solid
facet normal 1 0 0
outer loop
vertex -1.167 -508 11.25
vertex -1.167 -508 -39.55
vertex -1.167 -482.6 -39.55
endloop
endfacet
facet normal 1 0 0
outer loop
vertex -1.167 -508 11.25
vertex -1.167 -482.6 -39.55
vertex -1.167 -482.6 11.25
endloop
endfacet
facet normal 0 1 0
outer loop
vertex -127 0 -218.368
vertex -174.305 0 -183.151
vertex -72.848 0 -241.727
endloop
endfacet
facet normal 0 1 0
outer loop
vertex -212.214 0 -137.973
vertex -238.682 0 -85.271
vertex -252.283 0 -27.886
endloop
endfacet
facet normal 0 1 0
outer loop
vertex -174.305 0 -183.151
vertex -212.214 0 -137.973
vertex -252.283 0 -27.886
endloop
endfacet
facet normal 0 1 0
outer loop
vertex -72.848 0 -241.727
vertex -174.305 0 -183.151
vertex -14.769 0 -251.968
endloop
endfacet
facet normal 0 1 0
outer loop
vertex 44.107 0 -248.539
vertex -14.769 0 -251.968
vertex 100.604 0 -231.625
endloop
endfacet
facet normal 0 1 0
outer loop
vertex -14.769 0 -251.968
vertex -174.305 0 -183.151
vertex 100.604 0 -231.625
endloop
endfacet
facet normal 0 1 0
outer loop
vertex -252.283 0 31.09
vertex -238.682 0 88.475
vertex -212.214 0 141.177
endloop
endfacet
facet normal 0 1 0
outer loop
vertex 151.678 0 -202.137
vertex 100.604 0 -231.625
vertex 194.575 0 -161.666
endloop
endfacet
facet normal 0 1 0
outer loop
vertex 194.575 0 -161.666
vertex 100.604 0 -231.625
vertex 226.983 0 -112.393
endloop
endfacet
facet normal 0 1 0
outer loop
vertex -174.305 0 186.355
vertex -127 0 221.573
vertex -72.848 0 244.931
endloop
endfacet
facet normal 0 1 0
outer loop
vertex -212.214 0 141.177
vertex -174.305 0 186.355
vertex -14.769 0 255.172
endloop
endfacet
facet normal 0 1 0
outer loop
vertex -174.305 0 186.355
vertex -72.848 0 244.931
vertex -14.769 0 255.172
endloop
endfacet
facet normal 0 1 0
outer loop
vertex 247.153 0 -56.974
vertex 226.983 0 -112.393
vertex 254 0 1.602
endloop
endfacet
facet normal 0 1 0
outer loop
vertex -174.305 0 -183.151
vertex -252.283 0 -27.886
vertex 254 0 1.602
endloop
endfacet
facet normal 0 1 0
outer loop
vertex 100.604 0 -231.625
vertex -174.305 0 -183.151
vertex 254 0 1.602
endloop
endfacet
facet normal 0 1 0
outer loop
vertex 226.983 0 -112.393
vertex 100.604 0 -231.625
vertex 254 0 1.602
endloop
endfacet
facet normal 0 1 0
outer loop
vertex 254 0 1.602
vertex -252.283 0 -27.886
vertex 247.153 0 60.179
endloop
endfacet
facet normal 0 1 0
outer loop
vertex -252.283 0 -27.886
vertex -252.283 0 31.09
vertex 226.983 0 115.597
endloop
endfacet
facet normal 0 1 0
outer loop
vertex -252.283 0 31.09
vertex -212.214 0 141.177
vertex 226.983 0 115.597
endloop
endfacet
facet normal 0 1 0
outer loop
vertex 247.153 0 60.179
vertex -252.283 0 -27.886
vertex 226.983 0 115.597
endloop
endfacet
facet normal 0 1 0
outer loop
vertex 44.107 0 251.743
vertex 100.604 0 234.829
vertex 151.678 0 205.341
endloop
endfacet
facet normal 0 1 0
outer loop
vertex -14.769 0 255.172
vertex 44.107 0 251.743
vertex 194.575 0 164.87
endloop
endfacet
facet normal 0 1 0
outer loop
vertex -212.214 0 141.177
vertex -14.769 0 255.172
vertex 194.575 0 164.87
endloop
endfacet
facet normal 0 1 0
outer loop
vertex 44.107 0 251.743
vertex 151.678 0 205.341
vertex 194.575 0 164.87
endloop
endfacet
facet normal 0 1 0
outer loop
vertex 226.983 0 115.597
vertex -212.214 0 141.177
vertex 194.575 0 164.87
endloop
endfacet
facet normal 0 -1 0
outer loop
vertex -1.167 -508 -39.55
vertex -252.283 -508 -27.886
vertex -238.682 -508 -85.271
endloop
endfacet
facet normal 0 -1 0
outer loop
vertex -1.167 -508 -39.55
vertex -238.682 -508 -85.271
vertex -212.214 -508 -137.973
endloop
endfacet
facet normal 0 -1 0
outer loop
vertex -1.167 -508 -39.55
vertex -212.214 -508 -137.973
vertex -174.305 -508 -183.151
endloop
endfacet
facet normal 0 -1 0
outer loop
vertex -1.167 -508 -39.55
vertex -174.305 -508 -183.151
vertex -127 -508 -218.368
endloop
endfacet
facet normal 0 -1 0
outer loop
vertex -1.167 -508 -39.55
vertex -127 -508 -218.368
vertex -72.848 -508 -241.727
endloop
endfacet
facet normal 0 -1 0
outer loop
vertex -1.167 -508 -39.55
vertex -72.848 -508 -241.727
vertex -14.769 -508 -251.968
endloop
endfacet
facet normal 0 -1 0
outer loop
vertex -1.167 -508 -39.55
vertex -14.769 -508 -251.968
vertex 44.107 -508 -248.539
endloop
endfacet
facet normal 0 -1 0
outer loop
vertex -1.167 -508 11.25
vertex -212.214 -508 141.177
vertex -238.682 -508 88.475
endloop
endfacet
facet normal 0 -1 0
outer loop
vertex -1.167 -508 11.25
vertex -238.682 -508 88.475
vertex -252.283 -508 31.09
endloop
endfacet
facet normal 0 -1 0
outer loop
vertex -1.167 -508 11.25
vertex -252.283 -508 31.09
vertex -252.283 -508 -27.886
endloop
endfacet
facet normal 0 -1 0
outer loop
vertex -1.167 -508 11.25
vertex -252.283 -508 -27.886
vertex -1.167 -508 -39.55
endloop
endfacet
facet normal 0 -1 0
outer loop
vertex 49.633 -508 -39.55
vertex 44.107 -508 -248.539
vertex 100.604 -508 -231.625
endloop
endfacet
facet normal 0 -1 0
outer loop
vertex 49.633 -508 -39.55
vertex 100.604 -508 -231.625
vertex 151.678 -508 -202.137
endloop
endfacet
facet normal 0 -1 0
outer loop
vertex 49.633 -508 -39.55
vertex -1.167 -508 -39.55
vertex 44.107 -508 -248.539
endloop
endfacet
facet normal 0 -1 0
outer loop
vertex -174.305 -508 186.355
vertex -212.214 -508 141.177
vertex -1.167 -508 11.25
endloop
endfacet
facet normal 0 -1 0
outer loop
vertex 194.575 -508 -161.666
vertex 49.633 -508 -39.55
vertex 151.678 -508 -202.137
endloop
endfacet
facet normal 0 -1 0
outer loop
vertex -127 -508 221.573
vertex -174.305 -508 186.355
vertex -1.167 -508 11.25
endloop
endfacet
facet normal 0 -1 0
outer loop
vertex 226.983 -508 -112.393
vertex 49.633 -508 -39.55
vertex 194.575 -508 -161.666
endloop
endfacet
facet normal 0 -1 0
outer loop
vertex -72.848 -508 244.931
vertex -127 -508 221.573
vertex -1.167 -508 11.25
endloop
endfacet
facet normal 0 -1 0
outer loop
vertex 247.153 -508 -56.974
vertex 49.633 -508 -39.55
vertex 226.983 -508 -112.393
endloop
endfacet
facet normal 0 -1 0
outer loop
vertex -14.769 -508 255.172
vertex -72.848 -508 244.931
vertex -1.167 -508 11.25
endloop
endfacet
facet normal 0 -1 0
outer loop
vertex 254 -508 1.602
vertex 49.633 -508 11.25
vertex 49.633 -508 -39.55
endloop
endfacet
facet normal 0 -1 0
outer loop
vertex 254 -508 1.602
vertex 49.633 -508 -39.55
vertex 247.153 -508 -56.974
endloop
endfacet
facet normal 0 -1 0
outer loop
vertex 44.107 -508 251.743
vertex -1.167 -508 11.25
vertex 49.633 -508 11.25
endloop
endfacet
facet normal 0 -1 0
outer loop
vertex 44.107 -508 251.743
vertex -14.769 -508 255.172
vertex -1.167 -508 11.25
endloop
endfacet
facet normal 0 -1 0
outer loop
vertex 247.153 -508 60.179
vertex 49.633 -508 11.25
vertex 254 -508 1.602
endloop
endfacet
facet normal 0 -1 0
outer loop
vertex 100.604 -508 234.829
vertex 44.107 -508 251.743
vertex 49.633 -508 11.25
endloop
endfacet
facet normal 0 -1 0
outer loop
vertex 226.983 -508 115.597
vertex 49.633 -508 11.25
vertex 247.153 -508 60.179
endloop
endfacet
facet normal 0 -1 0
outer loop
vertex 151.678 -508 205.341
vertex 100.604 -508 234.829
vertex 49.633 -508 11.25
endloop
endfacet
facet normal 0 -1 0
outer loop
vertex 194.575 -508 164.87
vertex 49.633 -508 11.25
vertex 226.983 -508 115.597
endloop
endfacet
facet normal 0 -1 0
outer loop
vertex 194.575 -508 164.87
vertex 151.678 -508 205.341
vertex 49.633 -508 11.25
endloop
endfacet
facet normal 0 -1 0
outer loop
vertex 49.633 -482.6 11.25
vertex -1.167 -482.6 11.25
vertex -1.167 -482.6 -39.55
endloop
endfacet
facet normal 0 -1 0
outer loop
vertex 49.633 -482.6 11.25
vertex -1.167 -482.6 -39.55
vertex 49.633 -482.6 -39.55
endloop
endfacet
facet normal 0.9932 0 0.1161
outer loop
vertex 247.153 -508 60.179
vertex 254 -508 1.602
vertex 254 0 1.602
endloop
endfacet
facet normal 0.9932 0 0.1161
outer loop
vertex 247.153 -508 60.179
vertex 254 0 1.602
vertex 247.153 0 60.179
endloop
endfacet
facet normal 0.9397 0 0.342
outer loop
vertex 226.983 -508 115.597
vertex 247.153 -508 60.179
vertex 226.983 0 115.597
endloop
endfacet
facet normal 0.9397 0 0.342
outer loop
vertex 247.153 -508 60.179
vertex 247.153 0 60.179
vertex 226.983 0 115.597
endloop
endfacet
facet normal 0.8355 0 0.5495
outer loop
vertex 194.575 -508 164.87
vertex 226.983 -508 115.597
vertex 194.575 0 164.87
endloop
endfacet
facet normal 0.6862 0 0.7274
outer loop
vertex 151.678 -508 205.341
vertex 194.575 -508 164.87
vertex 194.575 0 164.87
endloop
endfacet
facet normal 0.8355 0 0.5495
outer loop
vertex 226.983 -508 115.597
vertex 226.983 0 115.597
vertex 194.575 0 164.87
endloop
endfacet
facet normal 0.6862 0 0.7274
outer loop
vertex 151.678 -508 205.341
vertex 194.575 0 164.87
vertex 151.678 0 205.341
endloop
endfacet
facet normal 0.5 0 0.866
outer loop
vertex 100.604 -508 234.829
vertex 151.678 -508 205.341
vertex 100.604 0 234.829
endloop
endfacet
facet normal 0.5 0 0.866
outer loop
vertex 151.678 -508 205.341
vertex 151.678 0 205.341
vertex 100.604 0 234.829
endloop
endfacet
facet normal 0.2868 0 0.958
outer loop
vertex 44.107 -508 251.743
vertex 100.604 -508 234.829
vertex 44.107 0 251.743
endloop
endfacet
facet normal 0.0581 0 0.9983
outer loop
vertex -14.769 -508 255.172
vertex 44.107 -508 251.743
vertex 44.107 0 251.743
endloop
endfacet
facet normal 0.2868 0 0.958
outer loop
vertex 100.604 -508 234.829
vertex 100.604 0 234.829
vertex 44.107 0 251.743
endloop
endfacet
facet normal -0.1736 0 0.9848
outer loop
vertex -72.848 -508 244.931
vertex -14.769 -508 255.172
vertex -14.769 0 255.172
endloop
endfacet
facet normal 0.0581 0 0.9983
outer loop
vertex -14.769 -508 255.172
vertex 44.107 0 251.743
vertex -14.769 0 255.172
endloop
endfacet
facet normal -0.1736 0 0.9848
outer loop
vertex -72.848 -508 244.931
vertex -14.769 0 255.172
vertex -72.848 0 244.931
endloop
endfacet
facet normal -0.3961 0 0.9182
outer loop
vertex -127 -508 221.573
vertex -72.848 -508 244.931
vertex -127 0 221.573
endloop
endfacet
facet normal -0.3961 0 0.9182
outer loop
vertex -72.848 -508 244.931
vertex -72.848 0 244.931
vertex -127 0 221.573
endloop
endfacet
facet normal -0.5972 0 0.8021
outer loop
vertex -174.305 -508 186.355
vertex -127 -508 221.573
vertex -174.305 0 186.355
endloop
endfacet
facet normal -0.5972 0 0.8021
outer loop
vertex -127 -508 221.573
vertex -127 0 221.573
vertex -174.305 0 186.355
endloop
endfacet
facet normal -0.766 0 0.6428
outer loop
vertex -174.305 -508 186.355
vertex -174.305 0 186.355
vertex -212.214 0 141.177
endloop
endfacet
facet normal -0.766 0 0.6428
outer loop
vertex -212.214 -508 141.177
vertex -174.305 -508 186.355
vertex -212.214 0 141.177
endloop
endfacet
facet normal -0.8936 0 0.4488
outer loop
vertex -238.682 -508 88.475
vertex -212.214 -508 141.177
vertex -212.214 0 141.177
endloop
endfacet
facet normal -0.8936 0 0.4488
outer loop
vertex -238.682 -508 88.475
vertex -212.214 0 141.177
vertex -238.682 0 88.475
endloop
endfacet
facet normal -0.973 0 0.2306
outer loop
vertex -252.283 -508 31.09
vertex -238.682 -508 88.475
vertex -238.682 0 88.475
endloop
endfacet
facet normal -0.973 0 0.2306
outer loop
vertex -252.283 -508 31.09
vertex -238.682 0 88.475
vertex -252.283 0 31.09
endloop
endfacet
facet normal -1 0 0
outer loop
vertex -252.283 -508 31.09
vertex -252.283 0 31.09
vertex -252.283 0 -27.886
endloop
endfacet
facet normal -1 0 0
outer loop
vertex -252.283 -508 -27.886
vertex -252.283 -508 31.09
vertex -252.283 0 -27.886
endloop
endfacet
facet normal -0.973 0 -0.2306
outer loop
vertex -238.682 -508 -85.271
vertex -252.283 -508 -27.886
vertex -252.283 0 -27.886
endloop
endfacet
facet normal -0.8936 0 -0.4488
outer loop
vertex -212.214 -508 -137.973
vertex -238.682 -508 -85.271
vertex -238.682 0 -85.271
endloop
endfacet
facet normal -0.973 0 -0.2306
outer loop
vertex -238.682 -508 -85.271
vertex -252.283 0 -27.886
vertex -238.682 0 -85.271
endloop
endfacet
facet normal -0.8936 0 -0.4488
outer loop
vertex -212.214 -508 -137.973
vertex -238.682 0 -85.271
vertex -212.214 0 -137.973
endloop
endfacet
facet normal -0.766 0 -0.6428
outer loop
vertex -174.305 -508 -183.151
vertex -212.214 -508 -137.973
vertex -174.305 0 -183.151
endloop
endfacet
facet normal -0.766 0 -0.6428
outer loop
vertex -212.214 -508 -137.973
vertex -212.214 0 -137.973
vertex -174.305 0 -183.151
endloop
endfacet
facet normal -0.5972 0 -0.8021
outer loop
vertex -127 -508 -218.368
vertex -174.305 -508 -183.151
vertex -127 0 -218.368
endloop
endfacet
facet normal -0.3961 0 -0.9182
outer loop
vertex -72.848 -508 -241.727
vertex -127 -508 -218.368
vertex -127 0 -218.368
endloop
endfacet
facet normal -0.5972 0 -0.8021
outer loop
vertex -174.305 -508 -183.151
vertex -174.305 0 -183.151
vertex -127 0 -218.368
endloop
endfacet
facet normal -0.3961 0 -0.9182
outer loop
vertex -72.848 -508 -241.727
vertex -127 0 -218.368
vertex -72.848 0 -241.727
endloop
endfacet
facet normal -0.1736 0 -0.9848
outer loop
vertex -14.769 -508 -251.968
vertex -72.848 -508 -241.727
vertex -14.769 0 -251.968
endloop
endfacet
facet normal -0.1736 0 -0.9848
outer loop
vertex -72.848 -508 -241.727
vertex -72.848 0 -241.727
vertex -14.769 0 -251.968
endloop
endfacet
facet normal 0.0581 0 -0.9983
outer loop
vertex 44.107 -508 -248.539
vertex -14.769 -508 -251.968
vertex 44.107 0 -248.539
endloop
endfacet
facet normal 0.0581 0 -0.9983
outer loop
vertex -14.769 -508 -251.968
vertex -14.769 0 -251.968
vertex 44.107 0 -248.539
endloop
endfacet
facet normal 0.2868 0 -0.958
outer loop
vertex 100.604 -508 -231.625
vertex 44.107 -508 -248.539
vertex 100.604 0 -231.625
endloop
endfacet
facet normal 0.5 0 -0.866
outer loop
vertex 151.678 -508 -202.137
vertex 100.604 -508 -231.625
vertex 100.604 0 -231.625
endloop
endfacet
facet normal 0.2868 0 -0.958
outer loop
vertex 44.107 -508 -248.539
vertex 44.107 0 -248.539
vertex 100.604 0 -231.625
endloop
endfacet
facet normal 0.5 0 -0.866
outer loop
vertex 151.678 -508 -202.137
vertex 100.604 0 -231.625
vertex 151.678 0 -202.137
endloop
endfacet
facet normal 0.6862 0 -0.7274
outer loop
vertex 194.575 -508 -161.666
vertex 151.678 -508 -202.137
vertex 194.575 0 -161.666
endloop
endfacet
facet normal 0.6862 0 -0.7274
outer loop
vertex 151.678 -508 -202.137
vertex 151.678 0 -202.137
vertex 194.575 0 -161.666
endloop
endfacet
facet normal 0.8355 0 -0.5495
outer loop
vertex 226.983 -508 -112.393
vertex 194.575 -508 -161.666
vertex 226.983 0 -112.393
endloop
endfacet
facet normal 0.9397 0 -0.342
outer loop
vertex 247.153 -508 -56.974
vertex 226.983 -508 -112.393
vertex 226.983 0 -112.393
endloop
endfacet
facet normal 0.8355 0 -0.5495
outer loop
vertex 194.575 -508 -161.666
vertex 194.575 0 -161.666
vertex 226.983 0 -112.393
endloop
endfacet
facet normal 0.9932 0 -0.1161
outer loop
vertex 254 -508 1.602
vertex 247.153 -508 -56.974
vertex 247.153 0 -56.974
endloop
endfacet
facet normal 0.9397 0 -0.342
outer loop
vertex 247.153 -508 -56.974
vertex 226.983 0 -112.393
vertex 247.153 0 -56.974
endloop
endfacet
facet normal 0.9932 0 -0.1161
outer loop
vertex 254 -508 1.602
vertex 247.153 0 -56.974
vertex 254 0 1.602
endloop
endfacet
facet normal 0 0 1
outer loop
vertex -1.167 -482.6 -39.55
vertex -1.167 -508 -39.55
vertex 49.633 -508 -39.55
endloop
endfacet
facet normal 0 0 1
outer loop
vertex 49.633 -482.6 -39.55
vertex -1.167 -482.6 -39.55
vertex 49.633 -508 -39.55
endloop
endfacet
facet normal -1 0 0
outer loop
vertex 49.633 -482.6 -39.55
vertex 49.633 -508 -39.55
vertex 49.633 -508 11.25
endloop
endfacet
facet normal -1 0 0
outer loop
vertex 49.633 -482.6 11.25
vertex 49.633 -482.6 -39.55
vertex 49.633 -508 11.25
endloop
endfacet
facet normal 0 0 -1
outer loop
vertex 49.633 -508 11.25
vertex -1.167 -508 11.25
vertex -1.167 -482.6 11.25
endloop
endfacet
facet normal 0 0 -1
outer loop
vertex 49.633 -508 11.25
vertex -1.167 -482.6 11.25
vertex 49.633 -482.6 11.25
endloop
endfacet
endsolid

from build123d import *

# Parameters (mm, degrees)
F0_R          = 254
F1_DEPTH      = 508
F2_W          = 50.8
F2_H          = 50.8
F3_DEPTH      = 25.4
F3_DEPTH_BACK = 1134


# Not quite as in the source:
# - an extrude ends at something that could not be found from the text; its depth is read off the source's solid


with BuildPart() as f1:
    # F0 (on Front) → F1 (new body)
    with BuildSketch(Plane.XZ):
        with Locations((0, 1.6020847252)):
            Circle(F0_R)
    extrude(amount=F1_DEPTH)

    # F2 (on face) → F3 (cut, two sides)
    with BuildSketch(Plane.XZ.offset(508)) as f3_sk:
        with Locations((24.2332161129, -14.1495072007)):
            Rectangle(F2_W, F2_H)
    extrude(amount=-F3_DEPTH, mode=Mode.SUBTRACT)
    extrude(f3_sk.sketch, amount=F3_DEPTH_BACK, mode=Mode.SUBTRACT)


solid = f1.part
